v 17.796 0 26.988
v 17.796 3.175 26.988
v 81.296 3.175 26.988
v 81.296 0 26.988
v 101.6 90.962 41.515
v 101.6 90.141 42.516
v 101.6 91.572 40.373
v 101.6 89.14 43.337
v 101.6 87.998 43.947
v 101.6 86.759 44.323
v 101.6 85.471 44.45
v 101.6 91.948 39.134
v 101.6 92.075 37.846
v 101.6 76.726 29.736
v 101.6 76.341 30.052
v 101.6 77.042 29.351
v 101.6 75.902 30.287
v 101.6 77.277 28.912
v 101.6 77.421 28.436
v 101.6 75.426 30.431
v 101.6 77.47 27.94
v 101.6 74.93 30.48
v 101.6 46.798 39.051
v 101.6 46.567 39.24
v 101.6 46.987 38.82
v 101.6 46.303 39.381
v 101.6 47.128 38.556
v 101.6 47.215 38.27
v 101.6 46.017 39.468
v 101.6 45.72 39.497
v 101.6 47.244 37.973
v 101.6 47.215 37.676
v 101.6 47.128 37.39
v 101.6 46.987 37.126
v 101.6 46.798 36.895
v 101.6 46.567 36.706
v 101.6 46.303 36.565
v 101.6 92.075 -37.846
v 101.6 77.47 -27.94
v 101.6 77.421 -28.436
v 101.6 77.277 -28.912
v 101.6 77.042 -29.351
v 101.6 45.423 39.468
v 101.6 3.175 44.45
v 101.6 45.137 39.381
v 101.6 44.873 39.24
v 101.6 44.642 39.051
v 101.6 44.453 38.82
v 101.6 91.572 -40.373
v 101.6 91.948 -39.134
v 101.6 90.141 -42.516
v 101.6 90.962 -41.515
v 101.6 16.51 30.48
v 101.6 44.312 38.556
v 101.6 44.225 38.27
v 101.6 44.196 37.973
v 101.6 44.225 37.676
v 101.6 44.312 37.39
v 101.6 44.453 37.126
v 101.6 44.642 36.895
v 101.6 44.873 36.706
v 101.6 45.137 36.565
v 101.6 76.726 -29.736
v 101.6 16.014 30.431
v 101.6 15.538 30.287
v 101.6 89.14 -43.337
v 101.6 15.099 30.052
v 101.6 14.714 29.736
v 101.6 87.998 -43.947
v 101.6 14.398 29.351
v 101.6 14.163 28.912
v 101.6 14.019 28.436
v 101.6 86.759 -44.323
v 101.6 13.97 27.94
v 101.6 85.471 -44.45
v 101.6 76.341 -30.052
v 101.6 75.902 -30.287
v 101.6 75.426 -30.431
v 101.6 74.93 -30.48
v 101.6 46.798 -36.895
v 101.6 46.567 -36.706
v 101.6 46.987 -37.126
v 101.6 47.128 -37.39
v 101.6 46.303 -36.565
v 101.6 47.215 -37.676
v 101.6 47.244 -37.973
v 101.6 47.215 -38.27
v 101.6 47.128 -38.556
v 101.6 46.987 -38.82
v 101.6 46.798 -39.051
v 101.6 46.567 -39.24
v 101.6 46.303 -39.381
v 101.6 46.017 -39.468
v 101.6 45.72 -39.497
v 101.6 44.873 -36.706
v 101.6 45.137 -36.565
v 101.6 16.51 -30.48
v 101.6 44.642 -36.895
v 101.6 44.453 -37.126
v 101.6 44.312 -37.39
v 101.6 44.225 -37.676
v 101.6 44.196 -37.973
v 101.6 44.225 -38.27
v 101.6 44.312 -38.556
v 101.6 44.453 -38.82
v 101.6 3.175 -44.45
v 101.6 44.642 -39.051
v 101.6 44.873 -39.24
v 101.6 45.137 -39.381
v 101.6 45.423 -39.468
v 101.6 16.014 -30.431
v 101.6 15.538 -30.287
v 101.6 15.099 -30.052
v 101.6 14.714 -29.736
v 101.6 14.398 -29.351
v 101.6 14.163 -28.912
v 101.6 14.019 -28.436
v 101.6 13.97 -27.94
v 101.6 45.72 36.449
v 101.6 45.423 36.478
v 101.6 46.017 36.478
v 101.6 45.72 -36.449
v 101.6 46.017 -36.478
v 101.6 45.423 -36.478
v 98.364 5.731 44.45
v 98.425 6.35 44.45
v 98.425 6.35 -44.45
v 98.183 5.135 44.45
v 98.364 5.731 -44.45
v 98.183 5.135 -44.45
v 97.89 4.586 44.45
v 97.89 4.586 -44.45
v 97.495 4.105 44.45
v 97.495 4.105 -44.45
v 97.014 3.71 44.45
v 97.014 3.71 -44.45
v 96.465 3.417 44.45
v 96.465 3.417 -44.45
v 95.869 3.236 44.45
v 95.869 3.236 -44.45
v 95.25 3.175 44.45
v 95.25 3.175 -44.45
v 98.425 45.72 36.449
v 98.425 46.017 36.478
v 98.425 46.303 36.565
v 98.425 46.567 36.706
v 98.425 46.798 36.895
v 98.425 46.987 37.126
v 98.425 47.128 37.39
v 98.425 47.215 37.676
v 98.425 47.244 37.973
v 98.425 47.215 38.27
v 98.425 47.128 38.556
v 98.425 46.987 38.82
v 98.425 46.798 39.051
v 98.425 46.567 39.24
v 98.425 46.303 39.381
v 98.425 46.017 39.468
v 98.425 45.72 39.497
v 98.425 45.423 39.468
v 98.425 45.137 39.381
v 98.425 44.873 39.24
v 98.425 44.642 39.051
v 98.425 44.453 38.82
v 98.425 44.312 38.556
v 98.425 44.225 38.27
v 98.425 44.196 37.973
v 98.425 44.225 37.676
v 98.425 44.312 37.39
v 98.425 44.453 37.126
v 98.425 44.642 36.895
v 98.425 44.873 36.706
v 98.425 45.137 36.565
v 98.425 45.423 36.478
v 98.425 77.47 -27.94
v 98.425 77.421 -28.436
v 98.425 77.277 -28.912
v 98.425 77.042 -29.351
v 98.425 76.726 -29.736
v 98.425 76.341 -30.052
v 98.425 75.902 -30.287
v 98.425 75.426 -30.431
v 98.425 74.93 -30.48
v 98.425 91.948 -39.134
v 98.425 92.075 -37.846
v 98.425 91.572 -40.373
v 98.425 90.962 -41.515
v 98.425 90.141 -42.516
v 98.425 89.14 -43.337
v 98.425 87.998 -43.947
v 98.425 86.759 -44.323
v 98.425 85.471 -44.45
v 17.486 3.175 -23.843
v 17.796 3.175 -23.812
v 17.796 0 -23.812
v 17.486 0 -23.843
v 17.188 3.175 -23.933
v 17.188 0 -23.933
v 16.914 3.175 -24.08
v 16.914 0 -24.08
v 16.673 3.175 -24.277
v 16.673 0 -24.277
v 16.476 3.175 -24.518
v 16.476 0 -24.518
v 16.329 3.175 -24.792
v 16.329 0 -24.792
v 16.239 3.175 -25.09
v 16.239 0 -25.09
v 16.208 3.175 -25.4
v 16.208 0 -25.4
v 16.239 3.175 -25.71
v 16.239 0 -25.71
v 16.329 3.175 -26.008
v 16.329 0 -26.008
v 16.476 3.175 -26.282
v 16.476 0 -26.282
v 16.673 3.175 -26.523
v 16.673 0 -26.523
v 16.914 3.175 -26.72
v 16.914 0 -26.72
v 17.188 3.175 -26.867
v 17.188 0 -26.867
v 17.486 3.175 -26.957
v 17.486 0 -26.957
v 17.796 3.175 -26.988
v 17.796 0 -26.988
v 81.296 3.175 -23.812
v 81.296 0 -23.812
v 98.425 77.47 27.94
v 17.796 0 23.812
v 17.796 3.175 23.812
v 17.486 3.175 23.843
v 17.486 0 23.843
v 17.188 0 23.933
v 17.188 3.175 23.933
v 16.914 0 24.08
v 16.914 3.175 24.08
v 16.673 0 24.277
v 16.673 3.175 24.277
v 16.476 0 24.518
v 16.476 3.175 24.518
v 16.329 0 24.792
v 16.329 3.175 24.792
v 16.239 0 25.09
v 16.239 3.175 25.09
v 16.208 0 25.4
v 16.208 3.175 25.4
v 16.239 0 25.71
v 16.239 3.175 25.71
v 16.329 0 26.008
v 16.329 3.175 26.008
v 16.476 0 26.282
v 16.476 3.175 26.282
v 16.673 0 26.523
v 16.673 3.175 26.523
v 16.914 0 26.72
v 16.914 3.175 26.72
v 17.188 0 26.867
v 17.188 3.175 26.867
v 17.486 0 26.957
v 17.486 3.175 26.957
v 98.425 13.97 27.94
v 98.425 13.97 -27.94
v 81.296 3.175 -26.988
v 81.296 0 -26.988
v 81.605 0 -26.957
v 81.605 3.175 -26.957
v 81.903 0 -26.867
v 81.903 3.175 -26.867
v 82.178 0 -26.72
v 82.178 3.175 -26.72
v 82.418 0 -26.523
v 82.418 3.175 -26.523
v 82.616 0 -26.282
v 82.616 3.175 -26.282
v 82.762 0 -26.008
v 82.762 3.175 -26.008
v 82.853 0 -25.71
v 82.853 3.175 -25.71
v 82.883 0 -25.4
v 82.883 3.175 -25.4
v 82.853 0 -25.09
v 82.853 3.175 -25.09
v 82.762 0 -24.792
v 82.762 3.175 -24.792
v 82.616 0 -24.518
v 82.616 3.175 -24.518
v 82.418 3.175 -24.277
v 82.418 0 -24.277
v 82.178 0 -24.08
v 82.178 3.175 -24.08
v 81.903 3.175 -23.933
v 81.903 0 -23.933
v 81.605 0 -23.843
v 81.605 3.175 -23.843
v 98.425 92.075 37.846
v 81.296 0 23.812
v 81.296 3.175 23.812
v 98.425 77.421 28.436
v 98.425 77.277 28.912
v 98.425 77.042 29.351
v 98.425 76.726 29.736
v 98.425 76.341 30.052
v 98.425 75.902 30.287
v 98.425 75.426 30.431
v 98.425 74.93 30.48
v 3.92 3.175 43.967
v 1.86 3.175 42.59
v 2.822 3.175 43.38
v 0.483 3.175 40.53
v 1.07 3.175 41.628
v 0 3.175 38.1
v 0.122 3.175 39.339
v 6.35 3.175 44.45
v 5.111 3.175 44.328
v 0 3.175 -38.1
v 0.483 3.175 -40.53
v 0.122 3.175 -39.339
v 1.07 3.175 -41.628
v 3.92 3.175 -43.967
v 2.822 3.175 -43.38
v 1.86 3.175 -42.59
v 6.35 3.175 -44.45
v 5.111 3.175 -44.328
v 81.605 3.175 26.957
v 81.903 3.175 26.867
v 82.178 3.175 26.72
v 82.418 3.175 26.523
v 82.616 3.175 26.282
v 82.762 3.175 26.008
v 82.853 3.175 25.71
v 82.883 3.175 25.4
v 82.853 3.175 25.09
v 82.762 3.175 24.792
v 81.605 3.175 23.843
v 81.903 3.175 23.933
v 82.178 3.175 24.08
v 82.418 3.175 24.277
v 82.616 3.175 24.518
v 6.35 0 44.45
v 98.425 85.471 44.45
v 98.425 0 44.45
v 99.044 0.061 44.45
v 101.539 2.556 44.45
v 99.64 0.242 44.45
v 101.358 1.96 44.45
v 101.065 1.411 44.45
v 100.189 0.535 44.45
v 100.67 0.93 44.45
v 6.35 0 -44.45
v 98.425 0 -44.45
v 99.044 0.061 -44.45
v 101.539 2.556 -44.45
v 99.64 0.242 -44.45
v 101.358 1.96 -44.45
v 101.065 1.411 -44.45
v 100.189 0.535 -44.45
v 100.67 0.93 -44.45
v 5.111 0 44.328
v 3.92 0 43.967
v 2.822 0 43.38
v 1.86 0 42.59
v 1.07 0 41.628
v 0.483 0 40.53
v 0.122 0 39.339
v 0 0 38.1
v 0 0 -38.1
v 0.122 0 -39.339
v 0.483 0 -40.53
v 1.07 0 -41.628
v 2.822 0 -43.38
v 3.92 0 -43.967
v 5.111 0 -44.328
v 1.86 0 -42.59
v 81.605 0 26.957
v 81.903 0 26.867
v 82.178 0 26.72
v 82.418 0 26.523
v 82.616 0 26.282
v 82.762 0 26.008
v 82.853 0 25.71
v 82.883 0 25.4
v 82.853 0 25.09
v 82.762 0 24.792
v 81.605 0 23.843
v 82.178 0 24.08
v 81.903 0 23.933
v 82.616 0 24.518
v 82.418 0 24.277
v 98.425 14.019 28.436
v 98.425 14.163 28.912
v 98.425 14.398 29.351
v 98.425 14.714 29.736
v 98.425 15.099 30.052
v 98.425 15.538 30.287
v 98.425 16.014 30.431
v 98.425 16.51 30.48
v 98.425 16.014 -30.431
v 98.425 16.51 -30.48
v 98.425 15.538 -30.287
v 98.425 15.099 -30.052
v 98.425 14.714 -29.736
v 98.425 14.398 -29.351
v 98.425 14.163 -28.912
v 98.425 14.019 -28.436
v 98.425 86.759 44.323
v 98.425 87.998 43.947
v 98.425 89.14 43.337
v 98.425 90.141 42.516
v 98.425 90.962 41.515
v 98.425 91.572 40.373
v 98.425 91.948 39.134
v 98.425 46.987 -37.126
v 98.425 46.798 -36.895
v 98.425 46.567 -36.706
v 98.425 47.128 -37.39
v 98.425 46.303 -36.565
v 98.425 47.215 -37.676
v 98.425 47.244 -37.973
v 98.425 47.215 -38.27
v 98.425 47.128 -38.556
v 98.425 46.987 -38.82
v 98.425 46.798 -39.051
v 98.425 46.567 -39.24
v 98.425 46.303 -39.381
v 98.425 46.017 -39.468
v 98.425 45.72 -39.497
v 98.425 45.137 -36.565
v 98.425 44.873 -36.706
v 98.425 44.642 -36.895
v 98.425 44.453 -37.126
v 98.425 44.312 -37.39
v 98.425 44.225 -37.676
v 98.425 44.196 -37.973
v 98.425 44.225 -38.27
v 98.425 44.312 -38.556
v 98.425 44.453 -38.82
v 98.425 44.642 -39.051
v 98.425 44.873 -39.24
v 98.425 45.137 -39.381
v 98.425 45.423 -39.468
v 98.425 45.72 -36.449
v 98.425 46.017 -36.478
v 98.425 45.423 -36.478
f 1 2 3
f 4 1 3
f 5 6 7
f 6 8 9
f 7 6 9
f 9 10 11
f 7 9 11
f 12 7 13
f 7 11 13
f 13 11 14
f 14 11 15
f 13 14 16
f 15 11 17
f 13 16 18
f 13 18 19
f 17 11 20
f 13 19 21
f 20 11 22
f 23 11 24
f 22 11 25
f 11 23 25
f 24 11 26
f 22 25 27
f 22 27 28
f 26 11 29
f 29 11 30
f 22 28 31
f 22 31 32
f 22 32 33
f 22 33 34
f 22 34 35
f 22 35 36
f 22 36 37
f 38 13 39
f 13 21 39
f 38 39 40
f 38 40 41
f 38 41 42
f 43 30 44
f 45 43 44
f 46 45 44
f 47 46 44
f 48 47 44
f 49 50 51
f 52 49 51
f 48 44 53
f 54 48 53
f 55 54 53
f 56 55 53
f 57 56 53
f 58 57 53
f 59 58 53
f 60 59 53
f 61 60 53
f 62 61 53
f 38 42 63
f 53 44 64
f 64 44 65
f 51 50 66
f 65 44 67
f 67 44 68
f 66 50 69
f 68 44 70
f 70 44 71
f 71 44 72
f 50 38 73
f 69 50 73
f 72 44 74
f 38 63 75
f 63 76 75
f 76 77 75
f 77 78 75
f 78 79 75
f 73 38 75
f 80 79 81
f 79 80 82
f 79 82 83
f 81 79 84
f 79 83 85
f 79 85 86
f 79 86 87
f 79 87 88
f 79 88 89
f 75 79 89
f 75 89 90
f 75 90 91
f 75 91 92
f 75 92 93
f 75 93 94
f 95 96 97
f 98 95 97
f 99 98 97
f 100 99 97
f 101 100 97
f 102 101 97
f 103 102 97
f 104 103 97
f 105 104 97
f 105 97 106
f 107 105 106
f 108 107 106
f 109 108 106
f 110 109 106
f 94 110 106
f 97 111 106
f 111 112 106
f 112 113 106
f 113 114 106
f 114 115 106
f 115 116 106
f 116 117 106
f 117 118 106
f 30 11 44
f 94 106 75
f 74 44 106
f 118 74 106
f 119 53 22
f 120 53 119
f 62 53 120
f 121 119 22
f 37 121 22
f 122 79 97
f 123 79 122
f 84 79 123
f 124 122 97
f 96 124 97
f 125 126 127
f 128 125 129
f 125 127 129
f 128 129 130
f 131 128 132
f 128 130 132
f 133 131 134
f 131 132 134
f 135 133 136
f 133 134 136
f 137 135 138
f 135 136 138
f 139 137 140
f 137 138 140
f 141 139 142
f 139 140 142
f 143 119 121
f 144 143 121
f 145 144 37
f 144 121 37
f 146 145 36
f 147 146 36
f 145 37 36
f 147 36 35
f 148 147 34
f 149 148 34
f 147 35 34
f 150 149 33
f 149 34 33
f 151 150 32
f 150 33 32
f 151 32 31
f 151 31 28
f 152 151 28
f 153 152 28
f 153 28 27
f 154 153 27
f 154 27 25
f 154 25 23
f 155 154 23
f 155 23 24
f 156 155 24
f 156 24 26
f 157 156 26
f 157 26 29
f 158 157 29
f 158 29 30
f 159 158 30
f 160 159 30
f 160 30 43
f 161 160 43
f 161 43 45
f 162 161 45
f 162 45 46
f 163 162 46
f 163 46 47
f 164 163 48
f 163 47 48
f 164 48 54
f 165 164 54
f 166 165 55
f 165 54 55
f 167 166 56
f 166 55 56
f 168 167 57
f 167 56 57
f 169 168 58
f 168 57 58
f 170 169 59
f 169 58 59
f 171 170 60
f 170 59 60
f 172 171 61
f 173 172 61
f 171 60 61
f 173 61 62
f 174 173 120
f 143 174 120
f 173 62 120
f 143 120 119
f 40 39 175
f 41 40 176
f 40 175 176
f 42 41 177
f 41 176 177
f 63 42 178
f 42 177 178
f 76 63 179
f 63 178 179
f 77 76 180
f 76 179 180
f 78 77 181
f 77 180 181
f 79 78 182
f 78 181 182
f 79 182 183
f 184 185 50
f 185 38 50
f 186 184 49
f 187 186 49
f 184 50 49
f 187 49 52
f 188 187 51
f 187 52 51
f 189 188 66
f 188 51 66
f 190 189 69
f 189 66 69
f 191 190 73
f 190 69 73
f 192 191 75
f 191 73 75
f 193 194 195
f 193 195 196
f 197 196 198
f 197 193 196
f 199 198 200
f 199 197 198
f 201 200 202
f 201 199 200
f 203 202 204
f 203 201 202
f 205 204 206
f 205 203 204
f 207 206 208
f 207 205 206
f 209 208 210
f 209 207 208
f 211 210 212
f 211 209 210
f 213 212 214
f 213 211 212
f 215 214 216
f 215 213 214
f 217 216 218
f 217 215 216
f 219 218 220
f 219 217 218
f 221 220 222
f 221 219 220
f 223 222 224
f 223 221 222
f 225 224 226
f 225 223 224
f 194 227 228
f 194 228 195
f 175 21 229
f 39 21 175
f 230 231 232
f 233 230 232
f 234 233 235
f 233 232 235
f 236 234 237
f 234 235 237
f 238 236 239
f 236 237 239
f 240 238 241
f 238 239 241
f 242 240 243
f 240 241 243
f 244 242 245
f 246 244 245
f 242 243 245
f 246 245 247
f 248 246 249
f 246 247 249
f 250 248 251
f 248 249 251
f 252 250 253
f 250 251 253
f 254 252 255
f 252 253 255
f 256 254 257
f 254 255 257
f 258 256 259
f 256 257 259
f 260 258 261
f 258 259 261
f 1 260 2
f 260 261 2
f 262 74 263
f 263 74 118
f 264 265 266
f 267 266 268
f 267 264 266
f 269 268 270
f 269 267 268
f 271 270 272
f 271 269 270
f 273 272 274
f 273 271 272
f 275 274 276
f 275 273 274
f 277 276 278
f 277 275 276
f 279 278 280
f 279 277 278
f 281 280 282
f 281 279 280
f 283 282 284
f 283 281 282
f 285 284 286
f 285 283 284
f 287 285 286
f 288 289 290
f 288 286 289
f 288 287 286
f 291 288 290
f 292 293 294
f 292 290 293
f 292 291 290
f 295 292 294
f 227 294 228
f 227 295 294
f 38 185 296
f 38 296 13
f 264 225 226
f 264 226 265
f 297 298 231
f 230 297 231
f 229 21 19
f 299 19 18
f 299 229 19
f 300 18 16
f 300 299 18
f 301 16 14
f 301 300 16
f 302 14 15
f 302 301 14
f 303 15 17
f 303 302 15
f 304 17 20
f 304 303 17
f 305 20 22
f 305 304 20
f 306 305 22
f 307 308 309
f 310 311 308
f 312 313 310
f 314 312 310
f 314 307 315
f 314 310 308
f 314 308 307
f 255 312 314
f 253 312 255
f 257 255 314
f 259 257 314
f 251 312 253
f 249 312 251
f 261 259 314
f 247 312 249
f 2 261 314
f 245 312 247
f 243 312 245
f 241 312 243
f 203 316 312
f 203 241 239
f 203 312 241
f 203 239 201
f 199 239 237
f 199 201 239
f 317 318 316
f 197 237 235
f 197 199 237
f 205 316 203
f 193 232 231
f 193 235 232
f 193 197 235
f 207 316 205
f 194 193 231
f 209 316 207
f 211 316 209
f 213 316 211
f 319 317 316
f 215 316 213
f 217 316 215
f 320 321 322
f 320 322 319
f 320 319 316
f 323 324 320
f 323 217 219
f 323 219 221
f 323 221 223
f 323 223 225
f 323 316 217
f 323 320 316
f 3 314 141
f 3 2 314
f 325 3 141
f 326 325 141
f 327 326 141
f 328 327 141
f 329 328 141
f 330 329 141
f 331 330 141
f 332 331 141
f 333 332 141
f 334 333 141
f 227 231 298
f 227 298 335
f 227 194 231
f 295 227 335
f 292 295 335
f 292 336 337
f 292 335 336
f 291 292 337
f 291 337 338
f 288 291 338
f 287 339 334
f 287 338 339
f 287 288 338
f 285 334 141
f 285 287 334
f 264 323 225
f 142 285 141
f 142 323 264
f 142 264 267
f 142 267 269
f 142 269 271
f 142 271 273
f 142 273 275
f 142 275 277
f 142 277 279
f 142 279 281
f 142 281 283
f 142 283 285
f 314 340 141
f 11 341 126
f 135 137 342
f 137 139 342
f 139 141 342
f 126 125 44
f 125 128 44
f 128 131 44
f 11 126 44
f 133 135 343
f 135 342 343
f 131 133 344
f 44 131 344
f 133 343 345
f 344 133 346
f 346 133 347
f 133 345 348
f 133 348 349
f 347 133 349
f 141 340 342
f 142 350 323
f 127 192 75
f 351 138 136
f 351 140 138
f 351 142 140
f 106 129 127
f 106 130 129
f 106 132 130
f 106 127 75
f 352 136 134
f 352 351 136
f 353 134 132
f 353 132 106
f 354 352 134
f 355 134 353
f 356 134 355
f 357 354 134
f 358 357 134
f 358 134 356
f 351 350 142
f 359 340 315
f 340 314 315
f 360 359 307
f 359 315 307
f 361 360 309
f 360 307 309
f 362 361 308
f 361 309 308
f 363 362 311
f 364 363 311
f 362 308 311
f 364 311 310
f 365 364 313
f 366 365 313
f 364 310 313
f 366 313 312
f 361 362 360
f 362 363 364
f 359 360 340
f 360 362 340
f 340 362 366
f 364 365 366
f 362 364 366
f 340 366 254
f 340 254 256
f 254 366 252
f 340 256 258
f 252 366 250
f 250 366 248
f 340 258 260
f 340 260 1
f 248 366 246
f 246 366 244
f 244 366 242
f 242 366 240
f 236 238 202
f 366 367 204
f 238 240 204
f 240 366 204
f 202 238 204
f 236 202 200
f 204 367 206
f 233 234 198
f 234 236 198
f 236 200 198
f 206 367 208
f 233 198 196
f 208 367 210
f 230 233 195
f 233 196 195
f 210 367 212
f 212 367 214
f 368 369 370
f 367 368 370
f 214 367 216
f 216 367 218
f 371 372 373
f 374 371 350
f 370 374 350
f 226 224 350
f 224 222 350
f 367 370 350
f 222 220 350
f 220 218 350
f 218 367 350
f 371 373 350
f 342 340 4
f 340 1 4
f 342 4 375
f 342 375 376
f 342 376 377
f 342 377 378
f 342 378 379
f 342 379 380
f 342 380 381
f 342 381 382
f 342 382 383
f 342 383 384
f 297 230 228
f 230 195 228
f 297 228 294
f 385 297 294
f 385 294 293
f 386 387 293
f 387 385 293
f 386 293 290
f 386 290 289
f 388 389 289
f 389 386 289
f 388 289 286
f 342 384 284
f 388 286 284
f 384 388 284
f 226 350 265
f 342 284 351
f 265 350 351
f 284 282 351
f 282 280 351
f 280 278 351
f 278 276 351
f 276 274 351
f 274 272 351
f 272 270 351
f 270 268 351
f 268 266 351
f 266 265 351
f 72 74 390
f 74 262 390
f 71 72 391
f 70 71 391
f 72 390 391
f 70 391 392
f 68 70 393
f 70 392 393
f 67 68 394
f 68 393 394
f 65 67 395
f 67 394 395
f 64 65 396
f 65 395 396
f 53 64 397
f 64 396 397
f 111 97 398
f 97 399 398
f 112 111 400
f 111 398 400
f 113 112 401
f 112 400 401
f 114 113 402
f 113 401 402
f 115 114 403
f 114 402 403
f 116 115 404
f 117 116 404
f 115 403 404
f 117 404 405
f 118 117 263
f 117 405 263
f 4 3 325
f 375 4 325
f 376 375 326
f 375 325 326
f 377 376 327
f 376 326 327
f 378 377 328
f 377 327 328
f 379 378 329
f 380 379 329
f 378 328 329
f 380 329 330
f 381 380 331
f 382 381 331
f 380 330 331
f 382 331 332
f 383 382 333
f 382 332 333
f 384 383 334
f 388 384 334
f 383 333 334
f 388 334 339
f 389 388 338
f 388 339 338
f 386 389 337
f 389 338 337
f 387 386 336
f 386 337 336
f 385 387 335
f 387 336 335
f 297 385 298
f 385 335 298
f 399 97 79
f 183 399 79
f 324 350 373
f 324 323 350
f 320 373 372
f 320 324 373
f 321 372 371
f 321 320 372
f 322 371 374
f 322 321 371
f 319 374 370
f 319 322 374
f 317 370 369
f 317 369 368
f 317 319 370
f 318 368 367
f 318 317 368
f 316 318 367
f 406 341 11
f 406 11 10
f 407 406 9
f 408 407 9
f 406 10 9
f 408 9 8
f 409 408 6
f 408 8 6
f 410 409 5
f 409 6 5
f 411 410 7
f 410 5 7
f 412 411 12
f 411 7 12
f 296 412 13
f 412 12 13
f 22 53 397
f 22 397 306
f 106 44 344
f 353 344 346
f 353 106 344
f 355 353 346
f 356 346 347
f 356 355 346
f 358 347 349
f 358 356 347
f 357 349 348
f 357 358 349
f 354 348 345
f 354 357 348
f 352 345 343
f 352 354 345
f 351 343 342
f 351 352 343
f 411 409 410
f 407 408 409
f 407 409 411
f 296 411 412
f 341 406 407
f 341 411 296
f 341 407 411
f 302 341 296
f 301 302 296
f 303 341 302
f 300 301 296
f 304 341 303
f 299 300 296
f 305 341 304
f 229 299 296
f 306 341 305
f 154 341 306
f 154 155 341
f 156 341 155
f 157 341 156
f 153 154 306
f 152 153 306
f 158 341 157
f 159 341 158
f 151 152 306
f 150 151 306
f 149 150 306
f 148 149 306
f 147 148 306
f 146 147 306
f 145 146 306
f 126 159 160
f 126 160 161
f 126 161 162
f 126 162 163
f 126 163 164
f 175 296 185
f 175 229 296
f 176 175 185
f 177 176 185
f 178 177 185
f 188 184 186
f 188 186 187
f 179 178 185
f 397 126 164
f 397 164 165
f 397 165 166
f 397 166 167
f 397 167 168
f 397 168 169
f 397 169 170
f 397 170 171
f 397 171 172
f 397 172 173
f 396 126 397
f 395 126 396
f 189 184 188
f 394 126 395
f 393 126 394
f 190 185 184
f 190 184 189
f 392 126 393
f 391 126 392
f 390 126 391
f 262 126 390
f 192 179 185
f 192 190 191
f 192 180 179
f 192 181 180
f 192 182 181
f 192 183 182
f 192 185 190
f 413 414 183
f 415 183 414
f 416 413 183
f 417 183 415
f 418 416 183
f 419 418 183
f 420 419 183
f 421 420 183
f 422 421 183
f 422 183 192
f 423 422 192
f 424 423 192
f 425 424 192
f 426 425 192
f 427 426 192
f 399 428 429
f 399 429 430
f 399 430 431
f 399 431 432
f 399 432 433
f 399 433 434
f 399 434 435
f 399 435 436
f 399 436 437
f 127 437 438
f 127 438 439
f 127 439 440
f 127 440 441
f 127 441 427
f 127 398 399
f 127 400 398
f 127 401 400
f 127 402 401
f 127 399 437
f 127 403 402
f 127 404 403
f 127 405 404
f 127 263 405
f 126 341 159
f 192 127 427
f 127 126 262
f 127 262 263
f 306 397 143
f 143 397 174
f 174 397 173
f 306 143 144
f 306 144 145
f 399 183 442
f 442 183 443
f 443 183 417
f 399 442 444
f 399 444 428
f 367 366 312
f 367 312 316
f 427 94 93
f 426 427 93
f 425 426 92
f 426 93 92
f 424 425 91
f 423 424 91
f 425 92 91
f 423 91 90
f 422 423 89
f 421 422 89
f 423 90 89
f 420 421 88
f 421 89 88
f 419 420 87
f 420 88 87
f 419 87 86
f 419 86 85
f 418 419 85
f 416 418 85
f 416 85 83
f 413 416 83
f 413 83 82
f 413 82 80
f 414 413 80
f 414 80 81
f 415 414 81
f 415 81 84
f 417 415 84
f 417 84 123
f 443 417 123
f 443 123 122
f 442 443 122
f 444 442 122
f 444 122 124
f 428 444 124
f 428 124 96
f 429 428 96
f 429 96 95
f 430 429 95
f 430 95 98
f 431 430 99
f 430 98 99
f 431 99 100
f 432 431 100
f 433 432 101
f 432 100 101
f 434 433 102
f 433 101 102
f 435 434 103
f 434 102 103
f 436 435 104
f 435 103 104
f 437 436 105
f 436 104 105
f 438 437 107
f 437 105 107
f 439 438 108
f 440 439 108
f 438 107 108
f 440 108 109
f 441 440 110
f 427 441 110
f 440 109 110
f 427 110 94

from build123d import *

# Parameters (mm, degrees)
SKETCH2_W           = 101.6
SKETCH2_H           = 88.9
BOSS_EXTRUDE1_DEPTH = 3.175
SKETCH3_W           = 3.175
SKETCH3_H           = 88.9
BOSS_EXTRUDE2_DEPTH = 88.9
SKETCH5_R           = 1.524
SKETCH5_W           = 60.96
SKETCH5_H           = 63.5
CUT_EXTRUDE2_DEPTH  = 145.139405178
FILLET1_R           = 2.54
FILLET2_R           = 6.604
FILLET3_R           = 3.175
FILLET4_R           = 6.35
CUT_EXTRUDE3_DEPTH  = 143.132235964


with BuildPart() as part:
    # Sketch2 → Boss-Extrude1 (new body)
    with BuildSketch(Plane(origin=(0, 0, 0), x_dir=(1, 0, 0), z_dir=(0, 1, 0))):
        with Locations((50.8, 0)):
            Rectangle(SKETCH2_W, SKETCH2_H)
    extrude(amount=BOSS_EXTRUDE1_DEPTH)

    # Sketch3 → Boss-Extrude2 (add)
    with BuildSketch(Plane(origin=(0, 3.175, 0), x_dir=(1, 0, 0), z_dir=(0, 1, 0))):
        with Locations((100.0125, 0)):
            Rectangle(SKETCH3_W, SKETCH3_H)
    extrude(amount=BOSS_EXTRUDE2_DEPTH)

    # Sketch5 → Cut-Extrude2 (cut, through all)
    with BuildSketch(Plane(origin=(101.6, 0, 0), x_dir=(0, 0, -1), z_dir=(1, 0, 0))):
        with Locations((-37.973, 45.72)):
            Circle(SKETCH5_R)
        with Locations((37.973, 45.72)):
            Circle(SKETCH5_R)
        with Locations((0, 45.72)):
            Rectangle(SKETCH5_W, SKETCH5_H)
    extrude(amount=-CUT_EXTRUDE2_DEPTH, mode=Mode.SUBTRACT)

    # Fillet1
    fillet1_edges = [part.edges().sort_by_distance(p)[0] for p in [
        (100.0125, 13.97, 30.48),
        (100.0125, 77.47, 30.48),
        (100.0125, 77.47, -30.48),
        (100.0125, 13.97, -30.48),
    ]]
    fillet(fillet1_edges, radius=FILLET1_R)

    # Fillet2
    fillet2_edges = [part.edges().sort_by_distance(p)[0] for p in [
        (100.0125, 92.075, -44.45),
        (100.0125, 92.075, 44.45),
    ]]
    fillet(fillet2_edges, radius=FILLET2_R)

    # Fillet3
    fillet3_edges = [part.edges().sort_by_distance(p)[0] for p in [
        (98.425, 3.175, 0),
        (101.6, 0, 0),
    ]]
    fillet(fillet3_edges, radius=FILLET3_R)

    # Fillet4
    fillet4_edges = [part.edges().sort_by_distance(p)[0] for p in [
        (0, 1.5875, -44.45),
        (0, 1.5875, 44.45),
    ]]
    fillet(fillet4_edges, radius=FILLET4_R)

    # Sketch6 → Cut-Extrude3 (cut, through all)
    with BuildSketch(Plane(origin=(0, 3.175, 0), x_dir=(1, 0, 0), z_dir=(0, 1, 0))):
        with BuildLine():
            Line((17.795725812, 26.9875), (81.295725812, 26.9875))
            ThreePointArc((81.295725812, 26.9875), (82.883225812, 25.4), (81.295725812, 23.8125))
            Line((81.295725812, 23.8125), (17.795725812, 23.8125))
            ThreePointArc((17.795725812, 23.8125), (16.208225812, 25.4), (17.795725812, 26.9875))
        make_face()
        with BuildLine():
            Line((17.795725812, -26.9875), (81.295725812, -26.9875))
            ThreePointArc((81.295725812, -26.9875), (82.883225812, -25.4), (81.295725812, -23.8125))
            Line((81.295725812, -23.8125), (17.795725812, -23.8125))
            ThreePointArc((17.795725812, -23.8125), (16.208225812, -25.4), (17.795725812, -26.9875))
        make_face()
    extrude(amount=-CUT_EXTRUDE3_DEPTH, mode=Mode.SUBTRACT)


solid = part.part
